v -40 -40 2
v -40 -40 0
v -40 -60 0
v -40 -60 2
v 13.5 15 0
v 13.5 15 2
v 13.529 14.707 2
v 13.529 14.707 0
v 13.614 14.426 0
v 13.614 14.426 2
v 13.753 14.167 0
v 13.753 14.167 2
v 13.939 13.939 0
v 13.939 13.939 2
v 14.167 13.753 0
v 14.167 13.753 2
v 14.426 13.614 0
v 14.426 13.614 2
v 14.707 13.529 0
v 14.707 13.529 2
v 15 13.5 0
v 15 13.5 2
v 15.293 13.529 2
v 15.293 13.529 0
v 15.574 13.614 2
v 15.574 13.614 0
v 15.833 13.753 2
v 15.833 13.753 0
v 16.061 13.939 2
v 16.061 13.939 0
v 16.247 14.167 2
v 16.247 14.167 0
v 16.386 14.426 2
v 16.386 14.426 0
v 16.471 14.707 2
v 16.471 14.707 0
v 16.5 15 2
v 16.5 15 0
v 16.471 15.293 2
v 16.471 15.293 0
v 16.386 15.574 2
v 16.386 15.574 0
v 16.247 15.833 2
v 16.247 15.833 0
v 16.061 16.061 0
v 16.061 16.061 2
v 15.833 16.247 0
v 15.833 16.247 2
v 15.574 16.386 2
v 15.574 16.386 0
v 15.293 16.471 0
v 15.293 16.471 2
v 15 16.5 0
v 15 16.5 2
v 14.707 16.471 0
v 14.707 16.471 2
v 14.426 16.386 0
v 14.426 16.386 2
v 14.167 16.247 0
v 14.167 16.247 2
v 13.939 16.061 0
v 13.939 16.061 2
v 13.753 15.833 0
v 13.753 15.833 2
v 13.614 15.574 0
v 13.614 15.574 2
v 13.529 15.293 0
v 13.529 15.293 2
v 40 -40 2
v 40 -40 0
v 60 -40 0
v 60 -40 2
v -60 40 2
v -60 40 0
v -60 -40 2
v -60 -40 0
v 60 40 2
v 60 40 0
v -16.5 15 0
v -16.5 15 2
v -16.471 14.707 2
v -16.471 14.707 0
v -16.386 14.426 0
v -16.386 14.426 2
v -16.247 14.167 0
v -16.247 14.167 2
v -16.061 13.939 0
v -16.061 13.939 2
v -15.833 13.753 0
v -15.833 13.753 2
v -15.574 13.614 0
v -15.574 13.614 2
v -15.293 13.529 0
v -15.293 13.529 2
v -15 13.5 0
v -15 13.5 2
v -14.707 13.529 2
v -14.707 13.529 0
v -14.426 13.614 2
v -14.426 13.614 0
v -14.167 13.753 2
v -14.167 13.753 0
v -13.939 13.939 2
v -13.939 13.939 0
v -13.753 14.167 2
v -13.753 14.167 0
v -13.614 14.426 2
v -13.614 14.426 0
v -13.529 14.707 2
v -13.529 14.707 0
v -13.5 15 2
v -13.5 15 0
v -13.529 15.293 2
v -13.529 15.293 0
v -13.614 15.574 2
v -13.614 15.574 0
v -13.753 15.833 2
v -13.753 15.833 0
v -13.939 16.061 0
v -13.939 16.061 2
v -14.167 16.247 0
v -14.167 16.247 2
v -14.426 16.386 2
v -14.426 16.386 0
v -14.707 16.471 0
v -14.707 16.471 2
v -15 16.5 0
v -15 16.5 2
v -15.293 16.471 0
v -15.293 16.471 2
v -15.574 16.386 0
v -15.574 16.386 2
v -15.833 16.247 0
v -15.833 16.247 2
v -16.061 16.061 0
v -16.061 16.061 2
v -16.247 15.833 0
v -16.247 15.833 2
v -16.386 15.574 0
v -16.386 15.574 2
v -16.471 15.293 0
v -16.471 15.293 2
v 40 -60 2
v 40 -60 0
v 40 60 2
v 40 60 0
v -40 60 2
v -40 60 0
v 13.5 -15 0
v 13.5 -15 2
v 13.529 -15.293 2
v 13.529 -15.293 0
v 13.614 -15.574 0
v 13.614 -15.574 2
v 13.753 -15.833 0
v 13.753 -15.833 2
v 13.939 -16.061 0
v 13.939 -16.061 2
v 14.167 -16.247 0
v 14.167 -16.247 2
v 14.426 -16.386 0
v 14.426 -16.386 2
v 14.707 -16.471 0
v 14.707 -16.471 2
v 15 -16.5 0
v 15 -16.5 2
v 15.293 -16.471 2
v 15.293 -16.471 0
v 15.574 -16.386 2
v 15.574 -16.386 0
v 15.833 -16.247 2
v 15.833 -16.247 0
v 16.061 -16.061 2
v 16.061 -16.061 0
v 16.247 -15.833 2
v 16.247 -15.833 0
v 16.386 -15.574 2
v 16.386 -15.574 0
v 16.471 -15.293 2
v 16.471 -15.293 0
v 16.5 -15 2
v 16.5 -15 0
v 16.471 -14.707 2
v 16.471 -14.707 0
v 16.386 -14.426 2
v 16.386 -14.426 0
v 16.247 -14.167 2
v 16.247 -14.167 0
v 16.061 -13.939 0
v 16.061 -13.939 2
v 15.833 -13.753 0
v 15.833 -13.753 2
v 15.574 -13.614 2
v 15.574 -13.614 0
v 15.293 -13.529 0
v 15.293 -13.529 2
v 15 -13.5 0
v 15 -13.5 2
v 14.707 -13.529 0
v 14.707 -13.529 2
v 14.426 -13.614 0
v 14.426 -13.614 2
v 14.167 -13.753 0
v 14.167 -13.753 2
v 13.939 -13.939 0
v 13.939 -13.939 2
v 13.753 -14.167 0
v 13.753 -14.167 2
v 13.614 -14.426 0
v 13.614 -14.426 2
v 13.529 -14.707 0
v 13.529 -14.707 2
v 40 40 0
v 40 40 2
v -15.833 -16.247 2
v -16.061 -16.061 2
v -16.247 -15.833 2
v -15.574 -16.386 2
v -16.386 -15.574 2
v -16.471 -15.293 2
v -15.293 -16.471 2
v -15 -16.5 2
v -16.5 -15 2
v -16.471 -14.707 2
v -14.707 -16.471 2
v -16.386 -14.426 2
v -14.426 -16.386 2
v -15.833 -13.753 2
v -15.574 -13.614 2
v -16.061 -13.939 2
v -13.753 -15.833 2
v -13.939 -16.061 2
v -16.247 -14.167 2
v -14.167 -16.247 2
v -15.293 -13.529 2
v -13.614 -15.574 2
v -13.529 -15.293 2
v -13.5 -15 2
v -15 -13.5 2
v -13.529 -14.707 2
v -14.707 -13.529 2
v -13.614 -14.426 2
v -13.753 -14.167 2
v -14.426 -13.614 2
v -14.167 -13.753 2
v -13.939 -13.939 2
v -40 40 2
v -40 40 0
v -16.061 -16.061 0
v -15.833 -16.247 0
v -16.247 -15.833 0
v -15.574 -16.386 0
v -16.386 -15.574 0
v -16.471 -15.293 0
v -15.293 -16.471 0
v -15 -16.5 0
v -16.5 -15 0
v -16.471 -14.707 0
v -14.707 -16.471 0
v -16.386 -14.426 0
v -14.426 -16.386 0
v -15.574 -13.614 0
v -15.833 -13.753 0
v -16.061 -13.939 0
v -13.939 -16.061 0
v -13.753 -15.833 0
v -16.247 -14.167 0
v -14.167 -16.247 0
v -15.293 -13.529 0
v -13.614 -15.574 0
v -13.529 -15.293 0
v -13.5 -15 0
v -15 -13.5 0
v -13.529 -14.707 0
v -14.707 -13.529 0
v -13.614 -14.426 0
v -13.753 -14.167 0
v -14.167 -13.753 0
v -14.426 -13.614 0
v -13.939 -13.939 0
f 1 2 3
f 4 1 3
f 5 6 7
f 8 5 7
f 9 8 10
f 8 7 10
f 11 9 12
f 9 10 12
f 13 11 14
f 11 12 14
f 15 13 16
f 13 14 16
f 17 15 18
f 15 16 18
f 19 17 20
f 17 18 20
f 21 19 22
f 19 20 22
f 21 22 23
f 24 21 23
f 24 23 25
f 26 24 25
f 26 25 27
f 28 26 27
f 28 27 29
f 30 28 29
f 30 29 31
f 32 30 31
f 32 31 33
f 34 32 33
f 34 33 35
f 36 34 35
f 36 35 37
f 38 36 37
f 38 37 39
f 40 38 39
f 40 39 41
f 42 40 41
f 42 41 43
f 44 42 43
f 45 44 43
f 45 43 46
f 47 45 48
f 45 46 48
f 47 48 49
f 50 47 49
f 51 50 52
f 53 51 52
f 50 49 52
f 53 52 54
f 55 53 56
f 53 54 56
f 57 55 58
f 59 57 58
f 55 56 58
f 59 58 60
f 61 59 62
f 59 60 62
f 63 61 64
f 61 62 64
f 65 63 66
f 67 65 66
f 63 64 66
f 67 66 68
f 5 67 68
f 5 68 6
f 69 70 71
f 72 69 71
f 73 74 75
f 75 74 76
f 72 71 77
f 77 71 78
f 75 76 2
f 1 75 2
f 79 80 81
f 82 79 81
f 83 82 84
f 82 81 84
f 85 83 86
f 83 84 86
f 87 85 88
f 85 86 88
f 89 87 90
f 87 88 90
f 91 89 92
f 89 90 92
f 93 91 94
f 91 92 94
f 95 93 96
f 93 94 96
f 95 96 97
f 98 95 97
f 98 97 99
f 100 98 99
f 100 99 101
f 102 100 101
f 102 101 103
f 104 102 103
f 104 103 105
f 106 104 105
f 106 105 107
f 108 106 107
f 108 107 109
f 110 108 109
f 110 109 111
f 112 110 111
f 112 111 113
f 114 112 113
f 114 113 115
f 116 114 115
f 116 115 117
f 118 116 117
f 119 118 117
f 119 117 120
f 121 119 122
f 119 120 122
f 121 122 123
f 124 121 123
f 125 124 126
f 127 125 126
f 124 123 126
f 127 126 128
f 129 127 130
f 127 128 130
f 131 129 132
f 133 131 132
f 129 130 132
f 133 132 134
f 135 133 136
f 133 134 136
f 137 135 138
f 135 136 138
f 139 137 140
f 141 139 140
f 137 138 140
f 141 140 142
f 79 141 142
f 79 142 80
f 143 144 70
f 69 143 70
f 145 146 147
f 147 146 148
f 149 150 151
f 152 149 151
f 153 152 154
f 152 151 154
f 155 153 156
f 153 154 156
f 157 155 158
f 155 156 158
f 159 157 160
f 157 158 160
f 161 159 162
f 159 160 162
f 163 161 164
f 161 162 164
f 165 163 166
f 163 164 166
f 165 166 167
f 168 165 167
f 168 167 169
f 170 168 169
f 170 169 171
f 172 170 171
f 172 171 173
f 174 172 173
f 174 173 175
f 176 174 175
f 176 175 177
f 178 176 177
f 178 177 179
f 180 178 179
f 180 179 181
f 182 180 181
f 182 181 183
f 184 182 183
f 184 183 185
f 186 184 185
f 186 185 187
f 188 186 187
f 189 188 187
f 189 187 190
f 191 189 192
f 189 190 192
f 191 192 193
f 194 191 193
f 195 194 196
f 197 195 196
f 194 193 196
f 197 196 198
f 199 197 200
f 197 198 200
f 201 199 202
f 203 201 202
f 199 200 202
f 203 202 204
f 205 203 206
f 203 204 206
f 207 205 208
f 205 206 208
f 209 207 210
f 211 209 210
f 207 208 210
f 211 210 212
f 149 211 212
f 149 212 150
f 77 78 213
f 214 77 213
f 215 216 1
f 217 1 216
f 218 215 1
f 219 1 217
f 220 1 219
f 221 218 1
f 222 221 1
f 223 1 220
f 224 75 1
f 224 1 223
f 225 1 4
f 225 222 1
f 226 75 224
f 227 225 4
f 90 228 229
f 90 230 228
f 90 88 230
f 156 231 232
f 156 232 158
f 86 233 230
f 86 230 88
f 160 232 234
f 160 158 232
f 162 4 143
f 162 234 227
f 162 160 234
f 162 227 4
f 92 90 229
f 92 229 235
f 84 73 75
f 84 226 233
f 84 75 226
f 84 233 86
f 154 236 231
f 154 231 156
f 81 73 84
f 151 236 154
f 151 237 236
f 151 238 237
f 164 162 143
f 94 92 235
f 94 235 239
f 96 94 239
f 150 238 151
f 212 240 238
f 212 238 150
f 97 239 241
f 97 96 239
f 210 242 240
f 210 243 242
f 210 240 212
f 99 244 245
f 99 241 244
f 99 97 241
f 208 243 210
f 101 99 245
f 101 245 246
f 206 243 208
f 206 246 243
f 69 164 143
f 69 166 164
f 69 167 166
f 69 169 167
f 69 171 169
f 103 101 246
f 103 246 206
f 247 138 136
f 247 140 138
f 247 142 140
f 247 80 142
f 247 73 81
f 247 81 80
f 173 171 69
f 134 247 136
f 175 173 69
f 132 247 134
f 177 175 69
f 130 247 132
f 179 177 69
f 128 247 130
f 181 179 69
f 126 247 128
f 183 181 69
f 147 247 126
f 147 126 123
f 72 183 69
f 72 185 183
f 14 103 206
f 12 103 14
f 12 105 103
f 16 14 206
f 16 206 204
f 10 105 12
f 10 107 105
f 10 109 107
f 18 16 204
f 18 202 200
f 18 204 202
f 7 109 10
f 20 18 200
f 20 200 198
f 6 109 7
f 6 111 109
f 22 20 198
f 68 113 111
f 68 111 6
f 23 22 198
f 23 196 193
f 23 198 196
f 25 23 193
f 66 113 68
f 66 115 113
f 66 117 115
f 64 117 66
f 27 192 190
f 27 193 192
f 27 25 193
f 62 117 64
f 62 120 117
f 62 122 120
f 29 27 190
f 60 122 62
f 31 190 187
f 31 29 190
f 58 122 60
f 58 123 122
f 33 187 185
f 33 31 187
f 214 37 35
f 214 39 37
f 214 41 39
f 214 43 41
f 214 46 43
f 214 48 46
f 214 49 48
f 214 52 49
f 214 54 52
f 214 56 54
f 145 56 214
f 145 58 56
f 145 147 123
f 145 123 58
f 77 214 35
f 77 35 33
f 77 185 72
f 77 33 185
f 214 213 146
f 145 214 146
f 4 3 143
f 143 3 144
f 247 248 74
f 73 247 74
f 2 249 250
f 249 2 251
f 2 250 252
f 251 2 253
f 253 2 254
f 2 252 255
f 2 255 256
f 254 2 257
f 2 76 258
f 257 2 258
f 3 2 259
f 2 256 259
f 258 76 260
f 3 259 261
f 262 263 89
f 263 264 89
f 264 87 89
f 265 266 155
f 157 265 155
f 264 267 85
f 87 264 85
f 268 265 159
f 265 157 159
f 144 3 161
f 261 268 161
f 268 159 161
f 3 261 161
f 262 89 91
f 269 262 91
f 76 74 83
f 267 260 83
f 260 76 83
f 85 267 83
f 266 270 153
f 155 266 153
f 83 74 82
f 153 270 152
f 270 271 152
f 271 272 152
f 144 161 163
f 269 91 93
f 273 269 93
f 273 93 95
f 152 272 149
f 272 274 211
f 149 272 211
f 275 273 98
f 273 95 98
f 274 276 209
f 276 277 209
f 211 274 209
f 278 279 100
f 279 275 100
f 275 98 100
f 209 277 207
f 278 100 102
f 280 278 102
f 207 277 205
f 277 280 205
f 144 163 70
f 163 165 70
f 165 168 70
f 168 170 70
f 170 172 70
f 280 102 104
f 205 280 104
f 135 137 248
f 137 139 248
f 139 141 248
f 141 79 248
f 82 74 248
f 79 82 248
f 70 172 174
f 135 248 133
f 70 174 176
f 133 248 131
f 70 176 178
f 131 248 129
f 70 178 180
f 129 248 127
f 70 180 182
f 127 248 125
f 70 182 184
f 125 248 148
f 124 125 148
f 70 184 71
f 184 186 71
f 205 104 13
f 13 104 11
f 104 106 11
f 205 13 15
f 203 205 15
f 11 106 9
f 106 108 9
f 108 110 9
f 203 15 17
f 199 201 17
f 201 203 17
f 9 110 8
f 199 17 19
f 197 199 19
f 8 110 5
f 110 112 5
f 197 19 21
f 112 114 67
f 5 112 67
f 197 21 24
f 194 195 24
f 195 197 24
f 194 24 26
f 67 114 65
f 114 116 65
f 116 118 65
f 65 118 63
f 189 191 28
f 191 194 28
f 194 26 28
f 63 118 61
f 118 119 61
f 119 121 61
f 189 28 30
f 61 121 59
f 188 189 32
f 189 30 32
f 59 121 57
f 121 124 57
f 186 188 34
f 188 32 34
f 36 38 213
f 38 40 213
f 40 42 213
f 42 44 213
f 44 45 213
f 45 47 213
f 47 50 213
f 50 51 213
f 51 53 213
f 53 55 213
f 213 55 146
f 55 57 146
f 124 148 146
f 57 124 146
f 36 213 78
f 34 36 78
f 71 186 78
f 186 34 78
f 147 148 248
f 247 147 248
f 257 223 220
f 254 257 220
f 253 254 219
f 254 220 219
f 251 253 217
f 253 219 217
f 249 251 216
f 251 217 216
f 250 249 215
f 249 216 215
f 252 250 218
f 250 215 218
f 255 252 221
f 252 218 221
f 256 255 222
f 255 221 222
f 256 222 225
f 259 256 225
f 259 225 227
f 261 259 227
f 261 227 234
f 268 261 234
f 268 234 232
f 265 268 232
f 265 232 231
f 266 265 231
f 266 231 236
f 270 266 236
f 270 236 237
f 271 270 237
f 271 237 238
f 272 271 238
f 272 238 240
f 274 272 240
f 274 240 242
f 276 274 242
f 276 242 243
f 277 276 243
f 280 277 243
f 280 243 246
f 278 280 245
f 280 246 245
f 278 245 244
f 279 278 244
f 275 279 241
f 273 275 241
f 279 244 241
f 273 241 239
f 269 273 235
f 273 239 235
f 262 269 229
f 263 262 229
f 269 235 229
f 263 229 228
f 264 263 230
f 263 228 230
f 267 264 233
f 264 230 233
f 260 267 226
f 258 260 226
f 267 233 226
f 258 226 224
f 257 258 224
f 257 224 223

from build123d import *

# Parameters (mm, degrees)
F2_DEPTH = 2
F3_D     = 3


with BuildPart() as f2:
    # F0 (on Top) → F2 (new body)
    with BuildSketch(Plane.XY):
        Polygon((40, 60), (0, 60), (-4.426457, 60), (-40, 60), (-40, 40), (-60, 40), (-60, 0), (-60, -40), (-40, -40), (-40, -60), (0, -60), (40, -60), (40, -40), (60, -40), (60, 0), (60, 40), (40, 40), align=None)
    extrude(amount=F2_DEPTH)

    # F3 (through all)
    with Locations(Plane(origin=(0, 0, 0), x_dir=(1, 0, 0), z_dir=(0, 0, -1))):
        with Locations((-15, 15), (15, 15), (-15, -15), (15, -15)):
            Hole(F3_D / 2)


solid = f2.part
